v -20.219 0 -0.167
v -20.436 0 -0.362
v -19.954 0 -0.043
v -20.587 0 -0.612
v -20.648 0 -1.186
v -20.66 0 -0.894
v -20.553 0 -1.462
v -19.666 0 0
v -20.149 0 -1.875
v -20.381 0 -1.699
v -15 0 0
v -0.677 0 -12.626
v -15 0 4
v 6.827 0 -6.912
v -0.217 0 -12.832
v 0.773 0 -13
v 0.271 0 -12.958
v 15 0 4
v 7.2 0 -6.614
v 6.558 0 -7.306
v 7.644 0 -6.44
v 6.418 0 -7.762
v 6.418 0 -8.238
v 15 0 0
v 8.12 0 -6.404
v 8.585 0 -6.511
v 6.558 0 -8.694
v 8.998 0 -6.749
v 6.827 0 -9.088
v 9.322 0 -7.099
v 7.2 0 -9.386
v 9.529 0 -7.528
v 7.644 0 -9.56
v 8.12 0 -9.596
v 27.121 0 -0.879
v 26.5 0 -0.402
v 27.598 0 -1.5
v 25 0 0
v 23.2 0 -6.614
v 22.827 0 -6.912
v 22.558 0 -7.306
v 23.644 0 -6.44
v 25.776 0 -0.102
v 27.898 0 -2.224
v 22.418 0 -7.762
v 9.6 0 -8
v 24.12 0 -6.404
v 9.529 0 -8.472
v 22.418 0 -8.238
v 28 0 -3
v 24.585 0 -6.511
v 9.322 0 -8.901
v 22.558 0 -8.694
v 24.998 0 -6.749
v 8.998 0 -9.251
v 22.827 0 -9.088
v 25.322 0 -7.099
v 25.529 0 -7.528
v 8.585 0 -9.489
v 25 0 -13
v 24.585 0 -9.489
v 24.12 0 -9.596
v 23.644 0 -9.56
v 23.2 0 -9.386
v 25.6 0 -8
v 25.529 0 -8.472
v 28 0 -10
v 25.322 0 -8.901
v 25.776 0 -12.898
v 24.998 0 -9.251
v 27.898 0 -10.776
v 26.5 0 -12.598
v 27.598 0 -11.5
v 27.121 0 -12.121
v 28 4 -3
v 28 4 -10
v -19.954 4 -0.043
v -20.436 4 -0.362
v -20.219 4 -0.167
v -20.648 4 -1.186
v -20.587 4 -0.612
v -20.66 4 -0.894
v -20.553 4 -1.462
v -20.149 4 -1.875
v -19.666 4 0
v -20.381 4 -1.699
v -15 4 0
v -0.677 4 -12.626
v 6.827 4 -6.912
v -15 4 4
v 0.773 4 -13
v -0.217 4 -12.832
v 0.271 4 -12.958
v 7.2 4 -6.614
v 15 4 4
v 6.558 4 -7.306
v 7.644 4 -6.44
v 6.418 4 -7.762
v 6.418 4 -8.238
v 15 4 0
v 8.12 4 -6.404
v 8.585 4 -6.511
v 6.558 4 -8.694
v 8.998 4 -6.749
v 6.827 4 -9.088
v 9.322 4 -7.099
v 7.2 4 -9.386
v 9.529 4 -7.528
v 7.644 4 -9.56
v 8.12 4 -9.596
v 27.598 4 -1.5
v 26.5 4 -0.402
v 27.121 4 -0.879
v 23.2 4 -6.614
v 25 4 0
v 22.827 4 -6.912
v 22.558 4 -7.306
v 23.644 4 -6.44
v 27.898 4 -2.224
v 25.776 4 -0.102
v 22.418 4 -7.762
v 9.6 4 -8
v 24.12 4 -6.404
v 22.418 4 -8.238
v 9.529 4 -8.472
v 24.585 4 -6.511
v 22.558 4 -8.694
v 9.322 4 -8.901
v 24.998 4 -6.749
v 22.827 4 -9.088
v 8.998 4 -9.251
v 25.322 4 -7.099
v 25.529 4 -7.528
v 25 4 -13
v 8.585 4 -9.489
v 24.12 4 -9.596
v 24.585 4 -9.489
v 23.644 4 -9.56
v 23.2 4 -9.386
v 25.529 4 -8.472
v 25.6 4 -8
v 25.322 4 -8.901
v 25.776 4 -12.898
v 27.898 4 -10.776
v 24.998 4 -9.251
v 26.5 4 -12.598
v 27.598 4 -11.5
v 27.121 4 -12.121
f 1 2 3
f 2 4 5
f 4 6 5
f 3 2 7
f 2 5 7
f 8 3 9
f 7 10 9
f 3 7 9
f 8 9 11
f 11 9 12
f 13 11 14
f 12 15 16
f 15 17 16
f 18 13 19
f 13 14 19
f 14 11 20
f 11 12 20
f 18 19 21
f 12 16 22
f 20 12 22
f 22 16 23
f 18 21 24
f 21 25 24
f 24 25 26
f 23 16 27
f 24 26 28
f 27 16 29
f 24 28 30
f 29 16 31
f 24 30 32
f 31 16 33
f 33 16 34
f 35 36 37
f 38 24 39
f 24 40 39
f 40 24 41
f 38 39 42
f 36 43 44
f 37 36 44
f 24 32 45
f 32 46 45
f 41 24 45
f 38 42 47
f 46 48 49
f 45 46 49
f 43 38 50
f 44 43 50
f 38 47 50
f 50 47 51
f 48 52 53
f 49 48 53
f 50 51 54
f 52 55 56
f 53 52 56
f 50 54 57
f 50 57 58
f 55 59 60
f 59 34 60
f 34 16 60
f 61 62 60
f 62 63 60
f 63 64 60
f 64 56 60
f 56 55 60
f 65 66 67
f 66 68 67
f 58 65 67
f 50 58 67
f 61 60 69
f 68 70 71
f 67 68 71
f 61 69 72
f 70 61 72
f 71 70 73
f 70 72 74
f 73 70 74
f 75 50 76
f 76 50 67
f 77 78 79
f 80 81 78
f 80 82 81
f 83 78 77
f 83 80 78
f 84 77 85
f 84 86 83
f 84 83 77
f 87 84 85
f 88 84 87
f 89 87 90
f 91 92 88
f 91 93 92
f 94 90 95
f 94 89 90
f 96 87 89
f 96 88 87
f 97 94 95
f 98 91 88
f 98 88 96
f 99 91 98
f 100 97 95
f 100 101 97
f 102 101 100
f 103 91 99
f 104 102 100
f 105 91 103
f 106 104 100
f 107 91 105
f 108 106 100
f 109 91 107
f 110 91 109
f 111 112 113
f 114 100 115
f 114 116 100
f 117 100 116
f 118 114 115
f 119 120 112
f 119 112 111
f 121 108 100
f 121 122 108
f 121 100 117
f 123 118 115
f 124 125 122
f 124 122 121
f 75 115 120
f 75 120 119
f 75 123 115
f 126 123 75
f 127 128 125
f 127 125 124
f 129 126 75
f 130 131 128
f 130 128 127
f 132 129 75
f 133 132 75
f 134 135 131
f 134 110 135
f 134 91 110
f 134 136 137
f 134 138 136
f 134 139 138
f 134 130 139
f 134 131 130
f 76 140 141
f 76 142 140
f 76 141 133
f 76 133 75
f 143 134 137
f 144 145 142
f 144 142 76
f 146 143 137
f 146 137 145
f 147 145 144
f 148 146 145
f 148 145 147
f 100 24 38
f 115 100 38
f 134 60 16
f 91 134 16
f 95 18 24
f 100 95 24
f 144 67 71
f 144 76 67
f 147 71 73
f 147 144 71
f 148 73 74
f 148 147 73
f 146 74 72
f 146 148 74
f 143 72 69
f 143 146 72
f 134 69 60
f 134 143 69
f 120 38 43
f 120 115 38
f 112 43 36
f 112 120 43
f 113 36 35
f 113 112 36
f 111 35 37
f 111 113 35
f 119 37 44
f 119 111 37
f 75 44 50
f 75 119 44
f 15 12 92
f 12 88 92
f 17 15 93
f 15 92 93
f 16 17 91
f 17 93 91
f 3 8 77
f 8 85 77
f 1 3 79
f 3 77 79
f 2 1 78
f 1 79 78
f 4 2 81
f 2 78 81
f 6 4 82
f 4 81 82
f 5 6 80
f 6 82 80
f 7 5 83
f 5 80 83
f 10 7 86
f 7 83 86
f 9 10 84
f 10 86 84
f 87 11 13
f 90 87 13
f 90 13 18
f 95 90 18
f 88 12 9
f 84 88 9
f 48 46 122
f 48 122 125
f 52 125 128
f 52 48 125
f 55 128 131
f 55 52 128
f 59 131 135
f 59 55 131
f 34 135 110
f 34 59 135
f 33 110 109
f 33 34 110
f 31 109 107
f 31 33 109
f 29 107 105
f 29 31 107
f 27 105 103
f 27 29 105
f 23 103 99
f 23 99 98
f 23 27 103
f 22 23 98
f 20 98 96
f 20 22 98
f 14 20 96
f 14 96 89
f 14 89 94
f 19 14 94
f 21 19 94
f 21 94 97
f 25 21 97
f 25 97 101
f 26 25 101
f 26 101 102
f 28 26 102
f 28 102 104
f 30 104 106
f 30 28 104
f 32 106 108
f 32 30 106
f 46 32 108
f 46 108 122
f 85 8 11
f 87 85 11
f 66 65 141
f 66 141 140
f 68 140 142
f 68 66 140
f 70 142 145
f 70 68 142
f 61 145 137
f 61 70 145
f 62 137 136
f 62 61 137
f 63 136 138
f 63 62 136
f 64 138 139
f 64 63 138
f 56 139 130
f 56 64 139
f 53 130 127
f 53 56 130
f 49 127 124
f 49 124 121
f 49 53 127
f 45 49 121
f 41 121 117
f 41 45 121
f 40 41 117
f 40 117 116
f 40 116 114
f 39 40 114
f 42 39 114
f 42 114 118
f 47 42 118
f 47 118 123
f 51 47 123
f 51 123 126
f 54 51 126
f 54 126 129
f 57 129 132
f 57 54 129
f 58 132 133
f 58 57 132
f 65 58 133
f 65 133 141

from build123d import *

# Parameters (mm, degrees)
SKETCH_1_R      = 1.6
EXTRUDE_1_DEPTH = 4
FILLET_1_R      = 3
FILLET_2_R      = 1


with BuildPart() as part:
    # ｽｹｯﾁ1 → ﾎﾞｽ - 押し出し1 (new body)
    with BuildSketch(Plane(origin=(0, 0, 0), x_dir=(1, 0, 0), z_dir=(0, 1, 0))):
        Polygon((-15, -4), (0, -4), (15, -4), (15, 0), (28, 0), (28, 13), (0, 13), (-23.545815275, 0), (-15, 0), align=None)
        with Locations((8, 8)):
            Circle(SKETCH_1_R, mode=Mode.SUBTRACT)
        with Locations((24, 8)):
            Circle(SKETCH_1_R, mode=Mode.SUBTRACT)
    extrude(amount=EXTRUDE_1_DEPTH)

    # ﾌｨﾚｯﾄ1
    fillet_1_edges = [part.edges().sort_by_distance(p)[0] for p in [
        (0, 2, -13),
        (28, 2, -13),
        (28, 2, 0),
    ]]
    fillet(fillet_1_edges, radius=FILLET_1_R)

    # ﾌｨﾚｯﾄ2
    fillet_2_edges = [part.edges().sort_by_distance(p)[0] for p in [
        (-23.545815275, 2, 0),
    ]]
    fillet(fillet_2_edges, radius=FILLET_2_R)


solid = part.part
